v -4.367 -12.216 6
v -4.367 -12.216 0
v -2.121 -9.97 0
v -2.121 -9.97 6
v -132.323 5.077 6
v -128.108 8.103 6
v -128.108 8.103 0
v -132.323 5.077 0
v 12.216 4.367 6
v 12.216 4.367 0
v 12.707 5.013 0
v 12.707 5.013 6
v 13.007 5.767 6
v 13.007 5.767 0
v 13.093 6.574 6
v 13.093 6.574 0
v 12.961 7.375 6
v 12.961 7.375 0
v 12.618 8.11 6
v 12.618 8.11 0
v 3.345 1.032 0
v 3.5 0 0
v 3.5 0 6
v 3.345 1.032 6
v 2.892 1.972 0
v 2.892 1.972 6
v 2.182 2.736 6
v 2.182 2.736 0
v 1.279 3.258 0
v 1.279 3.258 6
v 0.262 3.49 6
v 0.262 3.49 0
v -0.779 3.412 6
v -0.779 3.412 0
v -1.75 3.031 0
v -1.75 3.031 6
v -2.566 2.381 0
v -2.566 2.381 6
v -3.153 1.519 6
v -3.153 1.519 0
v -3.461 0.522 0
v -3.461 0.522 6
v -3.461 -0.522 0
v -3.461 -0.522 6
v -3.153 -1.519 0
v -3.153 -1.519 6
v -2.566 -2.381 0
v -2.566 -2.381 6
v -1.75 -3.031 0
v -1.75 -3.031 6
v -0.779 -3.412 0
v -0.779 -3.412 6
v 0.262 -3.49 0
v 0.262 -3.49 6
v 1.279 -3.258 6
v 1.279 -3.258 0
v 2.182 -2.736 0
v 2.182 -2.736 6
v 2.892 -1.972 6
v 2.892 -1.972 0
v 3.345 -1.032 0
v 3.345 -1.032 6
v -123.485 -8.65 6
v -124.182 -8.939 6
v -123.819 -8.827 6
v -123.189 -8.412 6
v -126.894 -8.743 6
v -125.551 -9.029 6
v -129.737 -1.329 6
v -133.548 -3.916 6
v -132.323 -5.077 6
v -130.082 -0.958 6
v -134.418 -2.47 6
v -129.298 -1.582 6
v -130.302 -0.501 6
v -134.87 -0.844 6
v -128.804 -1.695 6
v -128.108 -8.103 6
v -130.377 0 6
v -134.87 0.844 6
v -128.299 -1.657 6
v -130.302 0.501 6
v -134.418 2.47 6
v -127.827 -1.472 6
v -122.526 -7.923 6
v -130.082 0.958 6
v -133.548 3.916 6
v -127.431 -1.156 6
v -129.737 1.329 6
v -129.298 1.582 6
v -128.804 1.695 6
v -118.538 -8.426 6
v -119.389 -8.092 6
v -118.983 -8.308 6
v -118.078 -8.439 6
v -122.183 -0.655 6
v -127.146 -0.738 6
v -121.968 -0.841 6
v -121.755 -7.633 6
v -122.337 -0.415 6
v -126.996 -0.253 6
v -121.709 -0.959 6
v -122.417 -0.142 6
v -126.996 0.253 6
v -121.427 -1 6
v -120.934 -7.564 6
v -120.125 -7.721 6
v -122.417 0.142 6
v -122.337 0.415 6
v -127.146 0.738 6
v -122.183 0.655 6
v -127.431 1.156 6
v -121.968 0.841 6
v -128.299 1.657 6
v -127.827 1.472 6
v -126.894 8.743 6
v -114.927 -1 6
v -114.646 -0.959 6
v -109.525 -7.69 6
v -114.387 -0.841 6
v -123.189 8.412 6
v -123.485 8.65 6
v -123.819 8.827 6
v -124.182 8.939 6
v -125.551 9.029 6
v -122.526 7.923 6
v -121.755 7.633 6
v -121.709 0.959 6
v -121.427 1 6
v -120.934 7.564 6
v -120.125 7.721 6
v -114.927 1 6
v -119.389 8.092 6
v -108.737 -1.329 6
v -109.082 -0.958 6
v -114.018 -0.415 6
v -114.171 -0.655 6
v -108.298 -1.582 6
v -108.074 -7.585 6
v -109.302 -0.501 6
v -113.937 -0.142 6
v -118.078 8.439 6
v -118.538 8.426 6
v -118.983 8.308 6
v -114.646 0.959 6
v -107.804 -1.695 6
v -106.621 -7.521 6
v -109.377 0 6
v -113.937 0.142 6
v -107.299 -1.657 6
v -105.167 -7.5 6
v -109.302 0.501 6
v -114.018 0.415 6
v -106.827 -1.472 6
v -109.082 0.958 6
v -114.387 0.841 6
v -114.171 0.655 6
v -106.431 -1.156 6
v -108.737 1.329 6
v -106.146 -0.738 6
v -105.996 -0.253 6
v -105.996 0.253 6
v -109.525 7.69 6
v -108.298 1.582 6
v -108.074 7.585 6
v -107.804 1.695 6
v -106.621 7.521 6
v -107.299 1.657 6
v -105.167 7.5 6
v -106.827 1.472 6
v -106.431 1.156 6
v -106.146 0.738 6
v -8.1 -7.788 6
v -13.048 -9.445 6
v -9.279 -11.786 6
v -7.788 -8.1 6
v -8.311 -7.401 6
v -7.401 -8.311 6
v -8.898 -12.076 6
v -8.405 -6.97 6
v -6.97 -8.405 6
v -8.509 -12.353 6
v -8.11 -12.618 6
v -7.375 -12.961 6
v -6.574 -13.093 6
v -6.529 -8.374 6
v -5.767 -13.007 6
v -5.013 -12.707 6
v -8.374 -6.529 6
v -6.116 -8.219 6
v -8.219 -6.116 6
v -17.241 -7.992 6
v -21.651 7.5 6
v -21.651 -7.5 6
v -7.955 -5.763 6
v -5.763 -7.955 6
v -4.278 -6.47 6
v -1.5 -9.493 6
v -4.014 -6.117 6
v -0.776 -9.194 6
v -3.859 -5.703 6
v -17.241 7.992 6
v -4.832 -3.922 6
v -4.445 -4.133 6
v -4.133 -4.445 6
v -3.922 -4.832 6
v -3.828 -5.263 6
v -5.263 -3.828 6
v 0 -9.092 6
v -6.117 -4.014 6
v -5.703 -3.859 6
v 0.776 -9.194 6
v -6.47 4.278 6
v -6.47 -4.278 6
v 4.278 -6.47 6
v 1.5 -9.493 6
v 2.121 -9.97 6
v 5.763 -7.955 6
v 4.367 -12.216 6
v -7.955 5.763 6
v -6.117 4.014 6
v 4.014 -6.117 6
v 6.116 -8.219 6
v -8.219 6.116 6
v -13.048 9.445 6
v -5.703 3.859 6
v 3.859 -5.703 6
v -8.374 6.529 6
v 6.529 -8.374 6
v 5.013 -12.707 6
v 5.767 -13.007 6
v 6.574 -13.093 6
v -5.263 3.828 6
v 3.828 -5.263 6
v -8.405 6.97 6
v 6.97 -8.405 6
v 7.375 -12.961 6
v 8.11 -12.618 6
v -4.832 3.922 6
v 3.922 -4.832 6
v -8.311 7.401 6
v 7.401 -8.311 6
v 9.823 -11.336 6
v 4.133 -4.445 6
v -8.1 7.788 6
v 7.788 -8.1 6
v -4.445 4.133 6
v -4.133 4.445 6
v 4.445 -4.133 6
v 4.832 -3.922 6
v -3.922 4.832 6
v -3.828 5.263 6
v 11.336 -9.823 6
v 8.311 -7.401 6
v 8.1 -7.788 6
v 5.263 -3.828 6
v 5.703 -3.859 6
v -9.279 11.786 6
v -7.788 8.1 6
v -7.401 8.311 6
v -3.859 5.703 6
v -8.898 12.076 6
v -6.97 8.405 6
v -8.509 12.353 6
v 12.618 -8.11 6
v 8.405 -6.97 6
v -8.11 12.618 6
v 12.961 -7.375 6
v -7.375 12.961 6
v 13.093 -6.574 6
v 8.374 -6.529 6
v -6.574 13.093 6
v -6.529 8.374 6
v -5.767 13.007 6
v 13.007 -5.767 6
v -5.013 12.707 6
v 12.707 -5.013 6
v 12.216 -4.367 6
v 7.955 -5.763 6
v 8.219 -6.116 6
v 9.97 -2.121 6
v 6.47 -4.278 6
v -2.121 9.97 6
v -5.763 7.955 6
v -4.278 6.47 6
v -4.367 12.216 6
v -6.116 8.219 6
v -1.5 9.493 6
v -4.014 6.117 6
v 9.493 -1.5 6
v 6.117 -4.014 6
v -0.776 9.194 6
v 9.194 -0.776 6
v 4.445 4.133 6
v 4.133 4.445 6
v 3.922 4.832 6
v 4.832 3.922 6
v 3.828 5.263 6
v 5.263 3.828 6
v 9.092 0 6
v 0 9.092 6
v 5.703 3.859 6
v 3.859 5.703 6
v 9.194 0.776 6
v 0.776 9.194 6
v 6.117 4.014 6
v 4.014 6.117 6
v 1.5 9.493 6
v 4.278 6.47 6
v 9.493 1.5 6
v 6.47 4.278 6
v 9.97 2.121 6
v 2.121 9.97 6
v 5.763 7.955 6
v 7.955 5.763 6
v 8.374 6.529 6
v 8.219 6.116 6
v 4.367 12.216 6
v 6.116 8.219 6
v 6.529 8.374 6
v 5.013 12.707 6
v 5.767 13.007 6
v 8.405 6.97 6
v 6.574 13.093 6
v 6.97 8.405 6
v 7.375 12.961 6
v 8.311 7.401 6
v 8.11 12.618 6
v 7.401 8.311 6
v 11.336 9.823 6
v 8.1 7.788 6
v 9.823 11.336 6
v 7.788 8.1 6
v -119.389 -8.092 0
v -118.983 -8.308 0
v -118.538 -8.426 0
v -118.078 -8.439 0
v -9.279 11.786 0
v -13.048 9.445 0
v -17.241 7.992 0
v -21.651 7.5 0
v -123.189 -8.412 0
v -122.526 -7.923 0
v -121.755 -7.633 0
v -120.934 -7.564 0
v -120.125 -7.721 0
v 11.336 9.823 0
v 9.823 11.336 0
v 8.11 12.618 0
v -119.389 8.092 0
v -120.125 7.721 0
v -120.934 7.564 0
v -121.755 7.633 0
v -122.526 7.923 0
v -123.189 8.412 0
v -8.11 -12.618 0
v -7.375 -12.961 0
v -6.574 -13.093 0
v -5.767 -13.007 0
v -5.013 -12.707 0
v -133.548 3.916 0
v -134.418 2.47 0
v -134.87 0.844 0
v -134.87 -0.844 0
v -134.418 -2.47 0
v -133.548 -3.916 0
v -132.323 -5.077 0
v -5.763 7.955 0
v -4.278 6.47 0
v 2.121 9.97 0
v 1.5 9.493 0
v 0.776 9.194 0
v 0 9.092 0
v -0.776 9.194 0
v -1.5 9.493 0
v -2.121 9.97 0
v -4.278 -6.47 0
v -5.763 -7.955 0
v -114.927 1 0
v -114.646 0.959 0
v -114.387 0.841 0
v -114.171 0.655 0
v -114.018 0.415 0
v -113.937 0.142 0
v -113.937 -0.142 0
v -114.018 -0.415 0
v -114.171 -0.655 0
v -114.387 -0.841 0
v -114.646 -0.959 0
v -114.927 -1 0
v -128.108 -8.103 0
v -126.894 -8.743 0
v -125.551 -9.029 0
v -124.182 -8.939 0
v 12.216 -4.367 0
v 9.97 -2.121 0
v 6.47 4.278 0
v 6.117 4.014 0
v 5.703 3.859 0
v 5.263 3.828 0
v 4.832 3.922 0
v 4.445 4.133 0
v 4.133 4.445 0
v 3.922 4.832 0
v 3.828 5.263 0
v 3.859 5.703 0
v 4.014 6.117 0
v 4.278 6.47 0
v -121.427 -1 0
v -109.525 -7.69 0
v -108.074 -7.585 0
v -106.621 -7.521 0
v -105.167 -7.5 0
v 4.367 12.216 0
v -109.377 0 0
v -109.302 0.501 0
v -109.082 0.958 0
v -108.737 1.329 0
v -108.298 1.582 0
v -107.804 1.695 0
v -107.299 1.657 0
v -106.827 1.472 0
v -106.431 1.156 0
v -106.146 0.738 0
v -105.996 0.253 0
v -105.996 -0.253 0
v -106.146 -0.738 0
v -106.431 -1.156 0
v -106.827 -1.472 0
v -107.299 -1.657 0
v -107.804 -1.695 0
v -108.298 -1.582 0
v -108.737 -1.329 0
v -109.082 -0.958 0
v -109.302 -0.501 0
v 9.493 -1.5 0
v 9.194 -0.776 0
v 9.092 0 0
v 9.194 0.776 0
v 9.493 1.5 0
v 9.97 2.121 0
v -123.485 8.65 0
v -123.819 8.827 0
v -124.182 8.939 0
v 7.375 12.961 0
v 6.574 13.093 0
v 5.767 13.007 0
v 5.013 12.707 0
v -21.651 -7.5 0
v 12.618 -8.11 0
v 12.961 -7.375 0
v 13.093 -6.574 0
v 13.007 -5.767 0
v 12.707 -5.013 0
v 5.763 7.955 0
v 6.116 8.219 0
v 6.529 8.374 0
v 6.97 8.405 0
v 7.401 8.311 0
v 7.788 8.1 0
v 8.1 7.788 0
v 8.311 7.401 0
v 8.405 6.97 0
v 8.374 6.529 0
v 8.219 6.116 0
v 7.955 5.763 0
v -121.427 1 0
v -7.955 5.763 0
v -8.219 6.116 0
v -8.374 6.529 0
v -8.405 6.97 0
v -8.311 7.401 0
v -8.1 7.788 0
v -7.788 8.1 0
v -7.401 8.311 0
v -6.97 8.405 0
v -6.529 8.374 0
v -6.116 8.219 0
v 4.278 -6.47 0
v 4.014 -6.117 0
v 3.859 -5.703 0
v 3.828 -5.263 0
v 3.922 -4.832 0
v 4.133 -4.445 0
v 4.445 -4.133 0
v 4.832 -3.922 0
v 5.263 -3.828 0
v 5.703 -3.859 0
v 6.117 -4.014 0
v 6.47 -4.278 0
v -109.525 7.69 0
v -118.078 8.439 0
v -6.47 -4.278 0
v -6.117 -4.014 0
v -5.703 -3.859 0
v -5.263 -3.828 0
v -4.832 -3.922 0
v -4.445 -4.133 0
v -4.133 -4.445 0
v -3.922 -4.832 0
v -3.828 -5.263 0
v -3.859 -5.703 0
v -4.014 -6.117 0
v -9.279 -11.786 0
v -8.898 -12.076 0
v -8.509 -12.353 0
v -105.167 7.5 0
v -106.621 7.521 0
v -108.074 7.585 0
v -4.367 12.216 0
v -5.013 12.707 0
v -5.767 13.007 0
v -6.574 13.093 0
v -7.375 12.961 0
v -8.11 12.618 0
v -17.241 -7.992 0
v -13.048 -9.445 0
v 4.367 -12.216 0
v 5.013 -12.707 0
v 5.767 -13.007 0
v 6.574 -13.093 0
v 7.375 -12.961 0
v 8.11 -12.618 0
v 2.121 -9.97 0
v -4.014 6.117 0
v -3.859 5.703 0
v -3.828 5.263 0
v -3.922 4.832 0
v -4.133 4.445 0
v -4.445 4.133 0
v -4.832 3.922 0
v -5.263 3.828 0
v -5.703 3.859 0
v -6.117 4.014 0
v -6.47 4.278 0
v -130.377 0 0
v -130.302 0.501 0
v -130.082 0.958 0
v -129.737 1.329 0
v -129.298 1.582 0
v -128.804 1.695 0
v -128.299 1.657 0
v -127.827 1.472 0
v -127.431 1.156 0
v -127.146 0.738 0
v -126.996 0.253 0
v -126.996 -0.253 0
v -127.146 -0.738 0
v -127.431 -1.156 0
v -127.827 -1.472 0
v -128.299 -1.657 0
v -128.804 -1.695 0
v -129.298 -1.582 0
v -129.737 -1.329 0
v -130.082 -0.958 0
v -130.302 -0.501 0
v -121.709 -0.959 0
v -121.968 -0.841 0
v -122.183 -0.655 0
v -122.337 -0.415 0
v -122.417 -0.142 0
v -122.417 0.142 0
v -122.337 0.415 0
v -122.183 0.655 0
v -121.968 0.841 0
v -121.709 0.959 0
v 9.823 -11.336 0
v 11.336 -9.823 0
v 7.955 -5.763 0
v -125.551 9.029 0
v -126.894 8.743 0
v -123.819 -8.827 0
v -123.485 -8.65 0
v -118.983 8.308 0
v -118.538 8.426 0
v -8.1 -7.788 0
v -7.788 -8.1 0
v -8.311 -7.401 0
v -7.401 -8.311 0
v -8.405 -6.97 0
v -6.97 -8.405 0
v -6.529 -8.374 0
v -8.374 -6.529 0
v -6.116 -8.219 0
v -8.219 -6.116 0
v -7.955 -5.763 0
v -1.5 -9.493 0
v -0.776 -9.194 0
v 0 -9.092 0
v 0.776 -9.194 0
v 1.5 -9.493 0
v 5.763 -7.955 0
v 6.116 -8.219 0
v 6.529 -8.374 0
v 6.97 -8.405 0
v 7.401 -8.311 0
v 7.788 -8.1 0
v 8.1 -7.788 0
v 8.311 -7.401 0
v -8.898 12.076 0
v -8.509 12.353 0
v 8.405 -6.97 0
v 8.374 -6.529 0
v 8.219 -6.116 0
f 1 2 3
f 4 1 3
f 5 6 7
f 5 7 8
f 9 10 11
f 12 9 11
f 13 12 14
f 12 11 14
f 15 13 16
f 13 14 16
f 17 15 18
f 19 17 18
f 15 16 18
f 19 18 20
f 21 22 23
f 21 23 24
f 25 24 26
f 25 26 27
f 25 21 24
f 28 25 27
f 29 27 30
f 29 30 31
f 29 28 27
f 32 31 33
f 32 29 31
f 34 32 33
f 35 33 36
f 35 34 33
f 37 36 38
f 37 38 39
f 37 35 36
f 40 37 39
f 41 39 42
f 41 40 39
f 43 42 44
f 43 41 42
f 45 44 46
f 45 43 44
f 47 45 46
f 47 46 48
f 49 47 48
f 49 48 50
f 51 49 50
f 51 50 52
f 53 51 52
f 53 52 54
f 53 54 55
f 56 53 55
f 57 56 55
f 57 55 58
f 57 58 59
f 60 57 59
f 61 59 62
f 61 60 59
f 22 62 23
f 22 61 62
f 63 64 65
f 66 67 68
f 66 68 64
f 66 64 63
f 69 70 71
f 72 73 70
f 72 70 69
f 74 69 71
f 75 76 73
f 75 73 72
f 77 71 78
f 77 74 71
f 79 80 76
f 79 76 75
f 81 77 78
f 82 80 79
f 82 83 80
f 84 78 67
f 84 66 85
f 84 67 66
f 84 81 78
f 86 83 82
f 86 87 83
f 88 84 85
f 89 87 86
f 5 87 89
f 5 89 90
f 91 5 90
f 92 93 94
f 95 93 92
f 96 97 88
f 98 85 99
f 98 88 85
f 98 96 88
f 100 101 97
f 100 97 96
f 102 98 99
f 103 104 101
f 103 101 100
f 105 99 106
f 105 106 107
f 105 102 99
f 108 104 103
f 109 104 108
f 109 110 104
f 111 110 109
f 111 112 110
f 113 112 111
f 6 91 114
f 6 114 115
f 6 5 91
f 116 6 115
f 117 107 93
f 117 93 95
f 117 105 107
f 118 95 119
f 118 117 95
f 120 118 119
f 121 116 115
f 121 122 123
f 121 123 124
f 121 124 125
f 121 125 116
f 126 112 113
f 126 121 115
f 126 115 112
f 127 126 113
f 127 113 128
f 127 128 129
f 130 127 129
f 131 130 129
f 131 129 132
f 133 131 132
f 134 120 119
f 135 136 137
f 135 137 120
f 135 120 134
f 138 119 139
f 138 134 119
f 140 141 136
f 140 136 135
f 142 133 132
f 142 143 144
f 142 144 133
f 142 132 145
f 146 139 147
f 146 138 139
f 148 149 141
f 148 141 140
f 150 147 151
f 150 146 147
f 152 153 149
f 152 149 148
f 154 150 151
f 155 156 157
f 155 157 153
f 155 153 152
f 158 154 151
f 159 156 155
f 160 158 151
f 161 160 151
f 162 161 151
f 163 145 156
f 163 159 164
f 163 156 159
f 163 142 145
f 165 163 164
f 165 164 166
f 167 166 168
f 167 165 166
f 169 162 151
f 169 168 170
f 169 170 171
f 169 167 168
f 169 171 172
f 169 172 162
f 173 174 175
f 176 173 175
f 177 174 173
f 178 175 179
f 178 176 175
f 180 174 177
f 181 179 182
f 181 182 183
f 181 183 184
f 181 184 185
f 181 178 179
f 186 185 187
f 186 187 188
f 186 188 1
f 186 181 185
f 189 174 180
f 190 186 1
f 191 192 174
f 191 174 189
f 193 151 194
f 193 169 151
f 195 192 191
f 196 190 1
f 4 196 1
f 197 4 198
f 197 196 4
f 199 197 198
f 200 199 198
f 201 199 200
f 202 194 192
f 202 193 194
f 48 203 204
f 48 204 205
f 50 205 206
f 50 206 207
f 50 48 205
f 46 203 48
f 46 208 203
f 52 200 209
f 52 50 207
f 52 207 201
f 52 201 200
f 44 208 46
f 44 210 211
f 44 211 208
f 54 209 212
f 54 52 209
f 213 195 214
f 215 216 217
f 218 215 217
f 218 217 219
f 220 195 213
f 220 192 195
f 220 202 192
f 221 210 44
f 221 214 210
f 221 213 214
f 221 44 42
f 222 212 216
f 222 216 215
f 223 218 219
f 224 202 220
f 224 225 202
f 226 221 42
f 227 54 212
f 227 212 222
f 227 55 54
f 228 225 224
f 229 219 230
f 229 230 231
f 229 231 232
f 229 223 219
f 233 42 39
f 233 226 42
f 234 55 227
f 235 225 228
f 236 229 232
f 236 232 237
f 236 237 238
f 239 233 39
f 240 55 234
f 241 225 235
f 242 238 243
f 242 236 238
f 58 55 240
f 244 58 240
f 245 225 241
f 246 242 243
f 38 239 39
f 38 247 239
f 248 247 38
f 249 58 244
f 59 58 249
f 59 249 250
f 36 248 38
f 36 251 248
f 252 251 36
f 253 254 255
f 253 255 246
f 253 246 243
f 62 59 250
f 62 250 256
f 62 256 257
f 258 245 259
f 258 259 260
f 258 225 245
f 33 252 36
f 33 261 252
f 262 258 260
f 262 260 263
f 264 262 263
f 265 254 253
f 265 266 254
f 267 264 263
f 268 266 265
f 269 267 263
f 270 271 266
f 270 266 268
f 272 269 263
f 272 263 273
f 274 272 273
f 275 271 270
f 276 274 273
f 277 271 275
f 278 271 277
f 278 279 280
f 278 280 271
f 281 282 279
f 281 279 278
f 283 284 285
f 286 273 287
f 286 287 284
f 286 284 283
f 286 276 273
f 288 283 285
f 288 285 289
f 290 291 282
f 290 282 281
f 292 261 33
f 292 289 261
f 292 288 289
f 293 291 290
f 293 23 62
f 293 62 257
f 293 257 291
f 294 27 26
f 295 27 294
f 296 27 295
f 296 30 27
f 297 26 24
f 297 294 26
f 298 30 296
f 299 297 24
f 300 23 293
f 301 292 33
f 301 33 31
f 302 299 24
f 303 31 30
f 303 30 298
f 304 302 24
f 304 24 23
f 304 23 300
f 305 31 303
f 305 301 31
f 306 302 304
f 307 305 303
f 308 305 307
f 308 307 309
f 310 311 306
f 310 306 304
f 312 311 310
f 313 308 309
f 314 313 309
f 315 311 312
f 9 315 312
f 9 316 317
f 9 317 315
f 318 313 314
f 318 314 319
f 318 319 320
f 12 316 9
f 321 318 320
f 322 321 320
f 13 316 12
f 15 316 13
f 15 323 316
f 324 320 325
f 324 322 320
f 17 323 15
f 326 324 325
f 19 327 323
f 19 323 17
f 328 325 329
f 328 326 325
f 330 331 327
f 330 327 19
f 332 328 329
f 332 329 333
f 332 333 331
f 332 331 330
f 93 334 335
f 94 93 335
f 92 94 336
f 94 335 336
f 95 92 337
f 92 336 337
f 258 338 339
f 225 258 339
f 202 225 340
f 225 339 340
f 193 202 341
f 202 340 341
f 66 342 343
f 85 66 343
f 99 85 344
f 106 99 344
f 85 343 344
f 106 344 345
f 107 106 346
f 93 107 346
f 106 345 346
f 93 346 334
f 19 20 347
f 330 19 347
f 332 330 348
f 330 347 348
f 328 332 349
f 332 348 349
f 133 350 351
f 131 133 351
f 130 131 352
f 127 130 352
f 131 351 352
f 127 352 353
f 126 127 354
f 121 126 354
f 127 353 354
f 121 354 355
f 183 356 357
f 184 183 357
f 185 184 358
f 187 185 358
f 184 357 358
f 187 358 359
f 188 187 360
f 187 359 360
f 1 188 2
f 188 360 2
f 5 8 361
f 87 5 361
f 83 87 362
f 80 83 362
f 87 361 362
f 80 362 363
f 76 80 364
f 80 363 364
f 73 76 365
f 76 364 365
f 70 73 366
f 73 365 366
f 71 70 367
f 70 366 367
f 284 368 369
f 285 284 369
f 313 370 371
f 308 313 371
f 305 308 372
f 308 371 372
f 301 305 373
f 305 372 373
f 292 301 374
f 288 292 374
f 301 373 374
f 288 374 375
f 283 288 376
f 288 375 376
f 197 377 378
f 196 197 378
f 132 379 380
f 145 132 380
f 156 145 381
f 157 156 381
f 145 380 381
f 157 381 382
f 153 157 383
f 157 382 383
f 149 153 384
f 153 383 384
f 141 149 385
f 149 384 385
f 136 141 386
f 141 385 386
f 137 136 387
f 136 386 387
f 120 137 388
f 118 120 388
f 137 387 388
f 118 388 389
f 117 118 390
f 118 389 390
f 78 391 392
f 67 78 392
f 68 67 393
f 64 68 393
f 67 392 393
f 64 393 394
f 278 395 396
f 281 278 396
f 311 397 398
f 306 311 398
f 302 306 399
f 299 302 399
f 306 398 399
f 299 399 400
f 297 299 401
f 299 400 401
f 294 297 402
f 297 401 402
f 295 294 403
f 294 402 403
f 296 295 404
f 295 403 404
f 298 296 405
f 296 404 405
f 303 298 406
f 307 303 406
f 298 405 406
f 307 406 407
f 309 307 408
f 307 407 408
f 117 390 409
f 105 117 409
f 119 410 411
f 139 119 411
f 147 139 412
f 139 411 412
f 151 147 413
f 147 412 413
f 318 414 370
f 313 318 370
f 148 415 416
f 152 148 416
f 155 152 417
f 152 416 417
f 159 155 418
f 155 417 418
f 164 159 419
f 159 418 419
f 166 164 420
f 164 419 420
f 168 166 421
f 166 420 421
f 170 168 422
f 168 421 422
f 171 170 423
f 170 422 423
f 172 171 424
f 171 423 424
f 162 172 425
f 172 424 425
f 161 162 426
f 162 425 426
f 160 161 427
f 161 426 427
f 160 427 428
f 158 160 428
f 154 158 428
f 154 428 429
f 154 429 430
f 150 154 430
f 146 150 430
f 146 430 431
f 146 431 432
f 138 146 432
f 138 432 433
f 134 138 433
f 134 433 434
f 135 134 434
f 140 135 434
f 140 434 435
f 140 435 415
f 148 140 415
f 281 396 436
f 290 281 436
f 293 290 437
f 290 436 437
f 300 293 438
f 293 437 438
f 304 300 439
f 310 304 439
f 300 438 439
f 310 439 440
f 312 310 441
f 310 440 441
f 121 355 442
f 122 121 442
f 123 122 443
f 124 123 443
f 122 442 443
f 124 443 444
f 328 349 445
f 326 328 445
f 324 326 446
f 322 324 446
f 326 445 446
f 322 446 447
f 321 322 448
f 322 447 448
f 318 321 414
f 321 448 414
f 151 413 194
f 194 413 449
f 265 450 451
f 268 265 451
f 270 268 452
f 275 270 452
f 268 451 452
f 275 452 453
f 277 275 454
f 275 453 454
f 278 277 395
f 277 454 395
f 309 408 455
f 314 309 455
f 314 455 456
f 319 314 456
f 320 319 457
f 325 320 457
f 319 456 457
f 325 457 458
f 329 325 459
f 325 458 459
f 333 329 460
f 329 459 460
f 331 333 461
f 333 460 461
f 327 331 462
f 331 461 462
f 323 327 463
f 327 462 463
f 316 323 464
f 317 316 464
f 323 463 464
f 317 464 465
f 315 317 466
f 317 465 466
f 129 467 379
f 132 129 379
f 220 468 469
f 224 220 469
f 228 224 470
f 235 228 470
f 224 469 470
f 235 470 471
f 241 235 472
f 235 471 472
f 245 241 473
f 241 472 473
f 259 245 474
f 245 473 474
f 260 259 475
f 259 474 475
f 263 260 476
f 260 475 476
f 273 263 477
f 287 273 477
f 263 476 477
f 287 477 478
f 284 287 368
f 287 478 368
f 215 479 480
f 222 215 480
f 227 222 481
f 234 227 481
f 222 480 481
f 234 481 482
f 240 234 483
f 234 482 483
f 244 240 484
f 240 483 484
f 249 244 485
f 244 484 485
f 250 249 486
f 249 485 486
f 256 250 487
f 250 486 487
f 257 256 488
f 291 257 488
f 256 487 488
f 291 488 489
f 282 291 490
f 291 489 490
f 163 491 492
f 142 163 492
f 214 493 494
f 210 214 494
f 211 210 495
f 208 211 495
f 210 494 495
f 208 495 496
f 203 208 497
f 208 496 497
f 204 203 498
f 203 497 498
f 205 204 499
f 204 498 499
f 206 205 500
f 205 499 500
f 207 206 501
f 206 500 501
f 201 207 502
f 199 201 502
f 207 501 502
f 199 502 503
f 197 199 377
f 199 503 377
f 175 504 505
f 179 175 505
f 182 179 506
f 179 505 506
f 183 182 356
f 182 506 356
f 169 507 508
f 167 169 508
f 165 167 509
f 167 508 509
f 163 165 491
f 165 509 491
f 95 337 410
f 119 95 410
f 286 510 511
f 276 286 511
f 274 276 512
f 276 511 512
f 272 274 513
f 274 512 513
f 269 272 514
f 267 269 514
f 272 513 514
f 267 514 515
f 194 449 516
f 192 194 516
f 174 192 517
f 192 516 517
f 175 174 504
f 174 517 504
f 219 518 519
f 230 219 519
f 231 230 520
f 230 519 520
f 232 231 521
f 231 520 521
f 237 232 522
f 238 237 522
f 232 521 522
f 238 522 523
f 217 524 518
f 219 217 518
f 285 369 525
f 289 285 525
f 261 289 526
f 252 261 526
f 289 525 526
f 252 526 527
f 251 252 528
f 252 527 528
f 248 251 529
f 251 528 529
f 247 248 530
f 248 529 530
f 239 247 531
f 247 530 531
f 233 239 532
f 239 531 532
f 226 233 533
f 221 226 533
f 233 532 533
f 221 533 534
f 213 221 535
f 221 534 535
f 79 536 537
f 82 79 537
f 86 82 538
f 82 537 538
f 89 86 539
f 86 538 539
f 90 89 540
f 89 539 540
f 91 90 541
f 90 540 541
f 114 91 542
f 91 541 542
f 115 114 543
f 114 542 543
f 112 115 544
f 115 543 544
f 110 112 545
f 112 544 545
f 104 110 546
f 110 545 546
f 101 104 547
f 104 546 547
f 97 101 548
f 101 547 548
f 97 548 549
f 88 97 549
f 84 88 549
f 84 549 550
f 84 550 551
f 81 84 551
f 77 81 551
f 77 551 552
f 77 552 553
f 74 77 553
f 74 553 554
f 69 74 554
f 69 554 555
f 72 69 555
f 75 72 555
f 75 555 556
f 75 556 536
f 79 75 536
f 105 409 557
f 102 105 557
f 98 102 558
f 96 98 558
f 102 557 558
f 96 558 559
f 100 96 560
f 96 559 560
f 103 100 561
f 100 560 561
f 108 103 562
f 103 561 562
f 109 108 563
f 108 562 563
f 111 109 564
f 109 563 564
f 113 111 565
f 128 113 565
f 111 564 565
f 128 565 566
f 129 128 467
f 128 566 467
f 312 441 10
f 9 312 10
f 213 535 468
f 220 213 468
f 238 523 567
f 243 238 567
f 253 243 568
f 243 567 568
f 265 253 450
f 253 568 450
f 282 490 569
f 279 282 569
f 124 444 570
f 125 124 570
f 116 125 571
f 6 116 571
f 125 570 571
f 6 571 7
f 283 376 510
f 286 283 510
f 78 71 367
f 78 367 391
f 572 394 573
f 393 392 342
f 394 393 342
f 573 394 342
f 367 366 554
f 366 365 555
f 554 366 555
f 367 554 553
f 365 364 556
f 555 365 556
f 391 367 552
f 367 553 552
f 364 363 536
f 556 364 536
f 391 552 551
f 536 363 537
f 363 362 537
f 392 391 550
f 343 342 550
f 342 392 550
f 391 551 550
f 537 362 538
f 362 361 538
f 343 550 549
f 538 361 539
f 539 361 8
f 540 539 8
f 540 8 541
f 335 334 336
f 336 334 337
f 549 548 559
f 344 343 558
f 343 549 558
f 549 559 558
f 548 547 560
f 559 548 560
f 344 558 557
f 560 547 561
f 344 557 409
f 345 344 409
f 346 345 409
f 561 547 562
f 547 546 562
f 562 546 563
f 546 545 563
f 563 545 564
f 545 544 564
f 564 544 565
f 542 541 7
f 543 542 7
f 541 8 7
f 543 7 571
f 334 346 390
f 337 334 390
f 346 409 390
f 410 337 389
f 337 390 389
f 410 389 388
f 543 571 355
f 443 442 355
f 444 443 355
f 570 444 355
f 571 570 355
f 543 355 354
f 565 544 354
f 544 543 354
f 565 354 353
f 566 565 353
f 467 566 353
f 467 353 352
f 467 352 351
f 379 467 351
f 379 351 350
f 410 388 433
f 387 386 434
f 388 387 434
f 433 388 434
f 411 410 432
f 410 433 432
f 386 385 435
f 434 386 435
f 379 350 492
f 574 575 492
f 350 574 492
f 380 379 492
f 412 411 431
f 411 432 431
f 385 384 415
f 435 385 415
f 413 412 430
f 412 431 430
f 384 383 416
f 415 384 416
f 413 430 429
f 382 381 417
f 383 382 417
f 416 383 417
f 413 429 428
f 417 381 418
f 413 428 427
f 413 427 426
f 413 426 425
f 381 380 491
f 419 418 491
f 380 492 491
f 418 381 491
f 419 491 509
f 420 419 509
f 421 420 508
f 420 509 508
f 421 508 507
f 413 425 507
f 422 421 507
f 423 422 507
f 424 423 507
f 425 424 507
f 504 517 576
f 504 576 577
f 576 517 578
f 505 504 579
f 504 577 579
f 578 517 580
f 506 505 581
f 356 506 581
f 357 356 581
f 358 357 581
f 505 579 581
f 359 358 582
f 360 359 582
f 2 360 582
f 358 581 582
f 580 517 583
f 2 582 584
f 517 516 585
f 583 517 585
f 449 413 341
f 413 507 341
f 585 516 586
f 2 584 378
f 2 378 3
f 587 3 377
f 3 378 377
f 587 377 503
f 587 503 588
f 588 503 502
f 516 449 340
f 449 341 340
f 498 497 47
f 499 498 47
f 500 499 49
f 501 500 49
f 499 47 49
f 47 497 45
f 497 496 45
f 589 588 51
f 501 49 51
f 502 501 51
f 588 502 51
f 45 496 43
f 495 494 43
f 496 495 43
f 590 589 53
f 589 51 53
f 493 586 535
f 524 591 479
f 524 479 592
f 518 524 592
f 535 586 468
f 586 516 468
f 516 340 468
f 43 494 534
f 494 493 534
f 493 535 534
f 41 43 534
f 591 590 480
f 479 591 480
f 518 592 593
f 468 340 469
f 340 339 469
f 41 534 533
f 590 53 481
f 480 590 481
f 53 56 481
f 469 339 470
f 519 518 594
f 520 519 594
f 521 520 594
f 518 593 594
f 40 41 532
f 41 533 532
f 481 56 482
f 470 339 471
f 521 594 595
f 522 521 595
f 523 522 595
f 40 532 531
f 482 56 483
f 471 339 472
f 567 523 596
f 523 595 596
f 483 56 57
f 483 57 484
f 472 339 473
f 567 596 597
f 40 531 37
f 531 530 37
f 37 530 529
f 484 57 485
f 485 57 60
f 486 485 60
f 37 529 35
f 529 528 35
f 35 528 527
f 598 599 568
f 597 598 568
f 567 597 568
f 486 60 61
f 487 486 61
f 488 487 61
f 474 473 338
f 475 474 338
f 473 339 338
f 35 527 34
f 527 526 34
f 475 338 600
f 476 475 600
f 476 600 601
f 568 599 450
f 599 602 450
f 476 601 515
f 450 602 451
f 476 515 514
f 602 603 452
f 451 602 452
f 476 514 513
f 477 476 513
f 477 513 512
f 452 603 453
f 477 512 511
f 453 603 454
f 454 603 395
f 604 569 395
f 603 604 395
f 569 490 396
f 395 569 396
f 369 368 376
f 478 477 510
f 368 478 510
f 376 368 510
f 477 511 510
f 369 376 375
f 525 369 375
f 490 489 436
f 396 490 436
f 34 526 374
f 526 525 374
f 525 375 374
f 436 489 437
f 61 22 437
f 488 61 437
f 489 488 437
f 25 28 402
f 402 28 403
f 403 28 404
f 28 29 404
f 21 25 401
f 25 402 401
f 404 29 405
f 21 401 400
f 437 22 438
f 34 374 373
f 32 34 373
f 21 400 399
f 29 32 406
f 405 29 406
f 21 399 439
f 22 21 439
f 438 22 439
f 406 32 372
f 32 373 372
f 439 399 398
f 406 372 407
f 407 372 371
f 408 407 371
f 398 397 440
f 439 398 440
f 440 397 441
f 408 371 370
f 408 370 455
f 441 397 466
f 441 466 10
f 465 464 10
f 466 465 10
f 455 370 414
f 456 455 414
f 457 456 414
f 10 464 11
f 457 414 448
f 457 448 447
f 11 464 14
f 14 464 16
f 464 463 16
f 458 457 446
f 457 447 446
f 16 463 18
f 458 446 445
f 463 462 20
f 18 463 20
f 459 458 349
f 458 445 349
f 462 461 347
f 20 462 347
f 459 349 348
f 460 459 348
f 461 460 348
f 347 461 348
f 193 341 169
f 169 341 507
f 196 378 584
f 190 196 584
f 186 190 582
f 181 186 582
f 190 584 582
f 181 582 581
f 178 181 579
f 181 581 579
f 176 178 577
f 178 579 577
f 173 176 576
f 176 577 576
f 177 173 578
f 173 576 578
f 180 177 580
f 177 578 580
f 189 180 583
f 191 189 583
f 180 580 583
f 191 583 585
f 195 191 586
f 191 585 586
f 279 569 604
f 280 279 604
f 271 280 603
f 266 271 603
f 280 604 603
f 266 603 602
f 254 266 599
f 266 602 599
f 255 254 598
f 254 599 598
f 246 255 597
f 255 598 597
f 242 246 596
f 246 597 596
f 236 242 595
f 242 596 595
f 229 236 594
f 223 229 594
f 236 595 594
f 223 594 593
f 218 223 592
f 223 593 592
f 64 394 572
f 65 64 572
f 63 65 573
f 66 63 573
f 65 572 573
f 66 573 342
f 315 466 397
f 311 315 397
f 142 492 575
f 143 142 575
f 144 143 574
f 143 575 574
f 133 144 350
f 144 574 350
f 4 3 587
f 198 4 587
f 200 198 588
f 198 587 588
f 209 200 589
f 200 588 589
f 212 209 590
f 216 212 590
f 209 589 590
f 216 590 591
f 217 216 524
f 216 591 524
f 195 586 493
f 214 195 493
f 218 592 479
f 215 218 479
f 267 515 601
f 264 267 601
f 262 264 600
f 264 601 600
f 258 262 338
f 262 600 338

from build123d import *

# Parameters (mm, degrees)
SKETCH1_R                = 3.5
BOSS_EXTRUDE1_DEPTH      = 6
M3_CLEARANCE_HOLE1_D     = 3.4
M3_CLEARANCE_HOLE1_DEPTH = 6


with BuildPart() as part:
    # Sketch1 → Boss-Extrude1 (new body)
    with BuildSketch(Plane.XY):
        with BuildLine():
            Line((-118.078026422, -8.43859944), (-109.524525727, -7.690265095))
            ThreePointArc((-109.524525727, -7.690265095), (-107.347707958, -7.547588921), (-105.16673859, -7.5))
            Line((-105.16673859, -7.5), (-21.650635095, -7.5))
            ThreePointArc((-21.650635095, -7.5), (-15.104098388, -8.60177635), (-9.278843612, -11.785714286))
            ThreePointArc((-9.278843612, -11.785714286), (-8.704608747, -12.215964414), (-8.110455382, -12.618261112))
            ThreePointArc((-8.110455382, -12.618261112), (-6.167778591, -13.077430507), (-4.367043962, -12.215929233))
            Line((-4.367043962, -12.215929233), (-2.121320344, -9.970205615))
            ThreePointArc((-2.121320344, -9.970205615), (0, -9.091525958), (2.121320344, -9.970205615))
            Line((2.121320344, -9.970205615), (4.367043962, -12.215929233))
            ThreePointArc((4.367043962, -12.215929233), (6.167778591, -13.077430507), (8.110455382, -12.618261112))
            ThreePointArc((8.110455382, -12.618261112), (10.606601718, -10.606601718), (12.618261112, -8.110455382))
            ThreePointArc((12.618261112, -8.110455382), (13.077430507, -6.167778591), (12.215929233, -4.367043962))
            Line((12.215929233, -4.367043962), (9.970205615, -2.121320344))
            ThreePointArc((9.970205615, -2.121320344), (9.091525958, 0), (9.970205615, 2.121320344))
            Line((9.970205615, 2.121320344), (12.215929233, 4.367043962))
            ThreePointArc((12.215929233, 4.367043962), (13.077430507, 6.167778591), (12.618261112, 8.110455382))
            ThreePointArc((12.618261112, 8.110455382), (10.606601718, 10.606601718), (8.110455382, 12.618261112))
            ThreePointArc((8.110455382, 12.618261112), (6.167778591, 13.077430507), (4.367043962, 12.215929233))
            Line((4.367043962, 12.215929233), (2.121320344, 9.970205615))
            ThreePointArc((2.121320344, 9.970205615), (0, 9.091525958), (-2.121320344, 9.970205615))
            Line((-2.121320344, 9.970205615), (-4.367043962, 12.215929233))
            ThreePointArc((-4.367043962, 12.215929233), (-6.167778591, 13.077430507), (-8.110455382, 12.618261112))
            ThreePointArc((-8.110455382, 12.618261112), (-8.704608747, 12.215964414), (-9.278843612, 11.785714286))
            ThreePointArc((-9.278843612, 11.785714286), (-15.104098388, 8.60177635), (-21.650635095, 7.5))
            Line((-21.650635095, 7.5), (-105.16673859, 7.5))
            ThreePointArc((-105.16673859, 7.5), (-107.347707958, 7.547588921), (-109.524525727, 7.690265095))
            Line((-109.524525727, 7.690265095), (-118.078026422, 8.43859944))
            ThreePointArc((-118.078026422, 8.43859944), (-118.763989135, 8.379655937), (-119.389318724, 8.091589824))
            ThreePointArc((-119.389318724, 8.091589824), (-121.346764731, 7.570260106), (-123.189327607, 8.411890421))
            ThreePointArc((-123.189327607, 8.411890421), (-123.647802273, 8.746502417), (-124.181815085, 8.938842024))
            ThreePointArc((-124.181815085, 8.938842024), (-126.232348099, 8.932309996), (-128.107820511, 8.103255389))
            Line((-128.107820511, 8.103255389), (-132.322652835, 5.076759373))
            ThreePointArc((-132.322652835, 5.076759373), (-134.927242807, 0), (-132.322652835, -5.076759373))
            Line((-132.322652835, -5.076759373), (-128.107820511, -8.103255389))
            ThreePointArc((-128.107820511, -8.103255389), (-126.232348099, -8.932309996), (-124.181815085, -8.938842024))
            ThreePointArc((-124.181815085, -8.938842024), (-123.647802273, -8.746502417), (-123.189327607, -8.411890421))
            ThreePointArc((-123.189327607, -8.411890421), (-121.346764731, -7.570260106), (-119.389318724, -8.091589824))
            ThreePointArc((-119.389318724, -8.091589824), (-118.763989135, -8.379655937), (-118.078026422, -8.43859944))
        make_face()
        Circle(SKETCH1_R, mode=Mode.SUBTRACT)
        with BuildLine():
            Line((7.954951288, 5.762920267), (6.470027048, 4.277996026))
            ThreePointArc((6.470027048, 4.277996026), (4.277996026, 4.277996026), (4.277996026, 6.470027048))
            Line((4.277996026, 6.470027048), (5.762920267, 7.954951288))
            ThreePointArc((5.762920267, 7.954951288), (7.954951288, 7.954951288), (7.954951288, 5.762920267))
        make_face(mode=Mode.SUBTRACT)
        with BuildLine():
            Line((-5.762920267, 7.954951288), (-4.277996026, 6.470027048))
            ThreePointArc((-4.277996026, 6.470027048), (-4.277996026, 4.277996026), (-6.470027048, 4.277996026))
            Line((-6.470027048, 4.277996026), (-7.954951288, 5.762920267))
            ThreePointArc((-7.954951288, 5.762920267), (-7.954951288, 7.954951288), (-5.762920267, 7.954951288))
        make_face(mode=Mode.SUBTRACT)
        with BuildLine():
            Line((5.762920267, -7.954951288), (4.277996026, -6.470027048))
            ThreePointArc((4.277996026, -6.470027048), (4.277996026, -4.277996026), (6.470027048, -4.277996026))
            Line((6.470027048, -4.277996026), (7.954951288, -5.762920267))
            ThreePointArc((7.954951288, -5.762920267), (7.954951288, -7.954951288), (5.762920267, -7.954951288))
        make_face(mode=Mode.SUBTRACT)
        with BuildLine():
            Line((-7.954951288, -5.762920267), (-6.470027048, -4.277996026))
            ThreePointArc((-6.470027048, -4.277996026), (-4.277996026, -4.277996026), (-4.277996026, -6.470027048))
            Line((-4.277996026, -6.470027048), (-5.762920267, -7.954951288))
            ThreePointArc((-5.762920267, -7.954951288), (-7.954951288, -7.954951288), (-7.954951288, -5.762920267))
        make_face(mode=Mode.SUBTRACT)
        with BuildLine():
            Line((-121.427242807, 1), (-114.927242807, 1))
            ThreePointArc((-114.927242807, 1), (-113.927242807, 0), (-114.927242807, -1))
            Line((-114.927242807, -1), (-121.427242807, -1))
            ThreePointArc((-121.427242807, -1), (-122.427242807, 0), (-121.427242807, 1))
        make_face(mode=Mode.SUBTRACT)
    extrude(amount=BOSS_EXTRUDE1_DEPTH)

    # M3 Clearance Hole1
    with Locations(Plane.XY.offset(6)):
        with Locations((-107.677242807, 0), (-128.677242807, 0)):
            Hole(M3_CLEARANCE_HOLE1_D / 2, depth=M3_CLEARANCE_HOLE1_DEPTH)


solid = part.part
